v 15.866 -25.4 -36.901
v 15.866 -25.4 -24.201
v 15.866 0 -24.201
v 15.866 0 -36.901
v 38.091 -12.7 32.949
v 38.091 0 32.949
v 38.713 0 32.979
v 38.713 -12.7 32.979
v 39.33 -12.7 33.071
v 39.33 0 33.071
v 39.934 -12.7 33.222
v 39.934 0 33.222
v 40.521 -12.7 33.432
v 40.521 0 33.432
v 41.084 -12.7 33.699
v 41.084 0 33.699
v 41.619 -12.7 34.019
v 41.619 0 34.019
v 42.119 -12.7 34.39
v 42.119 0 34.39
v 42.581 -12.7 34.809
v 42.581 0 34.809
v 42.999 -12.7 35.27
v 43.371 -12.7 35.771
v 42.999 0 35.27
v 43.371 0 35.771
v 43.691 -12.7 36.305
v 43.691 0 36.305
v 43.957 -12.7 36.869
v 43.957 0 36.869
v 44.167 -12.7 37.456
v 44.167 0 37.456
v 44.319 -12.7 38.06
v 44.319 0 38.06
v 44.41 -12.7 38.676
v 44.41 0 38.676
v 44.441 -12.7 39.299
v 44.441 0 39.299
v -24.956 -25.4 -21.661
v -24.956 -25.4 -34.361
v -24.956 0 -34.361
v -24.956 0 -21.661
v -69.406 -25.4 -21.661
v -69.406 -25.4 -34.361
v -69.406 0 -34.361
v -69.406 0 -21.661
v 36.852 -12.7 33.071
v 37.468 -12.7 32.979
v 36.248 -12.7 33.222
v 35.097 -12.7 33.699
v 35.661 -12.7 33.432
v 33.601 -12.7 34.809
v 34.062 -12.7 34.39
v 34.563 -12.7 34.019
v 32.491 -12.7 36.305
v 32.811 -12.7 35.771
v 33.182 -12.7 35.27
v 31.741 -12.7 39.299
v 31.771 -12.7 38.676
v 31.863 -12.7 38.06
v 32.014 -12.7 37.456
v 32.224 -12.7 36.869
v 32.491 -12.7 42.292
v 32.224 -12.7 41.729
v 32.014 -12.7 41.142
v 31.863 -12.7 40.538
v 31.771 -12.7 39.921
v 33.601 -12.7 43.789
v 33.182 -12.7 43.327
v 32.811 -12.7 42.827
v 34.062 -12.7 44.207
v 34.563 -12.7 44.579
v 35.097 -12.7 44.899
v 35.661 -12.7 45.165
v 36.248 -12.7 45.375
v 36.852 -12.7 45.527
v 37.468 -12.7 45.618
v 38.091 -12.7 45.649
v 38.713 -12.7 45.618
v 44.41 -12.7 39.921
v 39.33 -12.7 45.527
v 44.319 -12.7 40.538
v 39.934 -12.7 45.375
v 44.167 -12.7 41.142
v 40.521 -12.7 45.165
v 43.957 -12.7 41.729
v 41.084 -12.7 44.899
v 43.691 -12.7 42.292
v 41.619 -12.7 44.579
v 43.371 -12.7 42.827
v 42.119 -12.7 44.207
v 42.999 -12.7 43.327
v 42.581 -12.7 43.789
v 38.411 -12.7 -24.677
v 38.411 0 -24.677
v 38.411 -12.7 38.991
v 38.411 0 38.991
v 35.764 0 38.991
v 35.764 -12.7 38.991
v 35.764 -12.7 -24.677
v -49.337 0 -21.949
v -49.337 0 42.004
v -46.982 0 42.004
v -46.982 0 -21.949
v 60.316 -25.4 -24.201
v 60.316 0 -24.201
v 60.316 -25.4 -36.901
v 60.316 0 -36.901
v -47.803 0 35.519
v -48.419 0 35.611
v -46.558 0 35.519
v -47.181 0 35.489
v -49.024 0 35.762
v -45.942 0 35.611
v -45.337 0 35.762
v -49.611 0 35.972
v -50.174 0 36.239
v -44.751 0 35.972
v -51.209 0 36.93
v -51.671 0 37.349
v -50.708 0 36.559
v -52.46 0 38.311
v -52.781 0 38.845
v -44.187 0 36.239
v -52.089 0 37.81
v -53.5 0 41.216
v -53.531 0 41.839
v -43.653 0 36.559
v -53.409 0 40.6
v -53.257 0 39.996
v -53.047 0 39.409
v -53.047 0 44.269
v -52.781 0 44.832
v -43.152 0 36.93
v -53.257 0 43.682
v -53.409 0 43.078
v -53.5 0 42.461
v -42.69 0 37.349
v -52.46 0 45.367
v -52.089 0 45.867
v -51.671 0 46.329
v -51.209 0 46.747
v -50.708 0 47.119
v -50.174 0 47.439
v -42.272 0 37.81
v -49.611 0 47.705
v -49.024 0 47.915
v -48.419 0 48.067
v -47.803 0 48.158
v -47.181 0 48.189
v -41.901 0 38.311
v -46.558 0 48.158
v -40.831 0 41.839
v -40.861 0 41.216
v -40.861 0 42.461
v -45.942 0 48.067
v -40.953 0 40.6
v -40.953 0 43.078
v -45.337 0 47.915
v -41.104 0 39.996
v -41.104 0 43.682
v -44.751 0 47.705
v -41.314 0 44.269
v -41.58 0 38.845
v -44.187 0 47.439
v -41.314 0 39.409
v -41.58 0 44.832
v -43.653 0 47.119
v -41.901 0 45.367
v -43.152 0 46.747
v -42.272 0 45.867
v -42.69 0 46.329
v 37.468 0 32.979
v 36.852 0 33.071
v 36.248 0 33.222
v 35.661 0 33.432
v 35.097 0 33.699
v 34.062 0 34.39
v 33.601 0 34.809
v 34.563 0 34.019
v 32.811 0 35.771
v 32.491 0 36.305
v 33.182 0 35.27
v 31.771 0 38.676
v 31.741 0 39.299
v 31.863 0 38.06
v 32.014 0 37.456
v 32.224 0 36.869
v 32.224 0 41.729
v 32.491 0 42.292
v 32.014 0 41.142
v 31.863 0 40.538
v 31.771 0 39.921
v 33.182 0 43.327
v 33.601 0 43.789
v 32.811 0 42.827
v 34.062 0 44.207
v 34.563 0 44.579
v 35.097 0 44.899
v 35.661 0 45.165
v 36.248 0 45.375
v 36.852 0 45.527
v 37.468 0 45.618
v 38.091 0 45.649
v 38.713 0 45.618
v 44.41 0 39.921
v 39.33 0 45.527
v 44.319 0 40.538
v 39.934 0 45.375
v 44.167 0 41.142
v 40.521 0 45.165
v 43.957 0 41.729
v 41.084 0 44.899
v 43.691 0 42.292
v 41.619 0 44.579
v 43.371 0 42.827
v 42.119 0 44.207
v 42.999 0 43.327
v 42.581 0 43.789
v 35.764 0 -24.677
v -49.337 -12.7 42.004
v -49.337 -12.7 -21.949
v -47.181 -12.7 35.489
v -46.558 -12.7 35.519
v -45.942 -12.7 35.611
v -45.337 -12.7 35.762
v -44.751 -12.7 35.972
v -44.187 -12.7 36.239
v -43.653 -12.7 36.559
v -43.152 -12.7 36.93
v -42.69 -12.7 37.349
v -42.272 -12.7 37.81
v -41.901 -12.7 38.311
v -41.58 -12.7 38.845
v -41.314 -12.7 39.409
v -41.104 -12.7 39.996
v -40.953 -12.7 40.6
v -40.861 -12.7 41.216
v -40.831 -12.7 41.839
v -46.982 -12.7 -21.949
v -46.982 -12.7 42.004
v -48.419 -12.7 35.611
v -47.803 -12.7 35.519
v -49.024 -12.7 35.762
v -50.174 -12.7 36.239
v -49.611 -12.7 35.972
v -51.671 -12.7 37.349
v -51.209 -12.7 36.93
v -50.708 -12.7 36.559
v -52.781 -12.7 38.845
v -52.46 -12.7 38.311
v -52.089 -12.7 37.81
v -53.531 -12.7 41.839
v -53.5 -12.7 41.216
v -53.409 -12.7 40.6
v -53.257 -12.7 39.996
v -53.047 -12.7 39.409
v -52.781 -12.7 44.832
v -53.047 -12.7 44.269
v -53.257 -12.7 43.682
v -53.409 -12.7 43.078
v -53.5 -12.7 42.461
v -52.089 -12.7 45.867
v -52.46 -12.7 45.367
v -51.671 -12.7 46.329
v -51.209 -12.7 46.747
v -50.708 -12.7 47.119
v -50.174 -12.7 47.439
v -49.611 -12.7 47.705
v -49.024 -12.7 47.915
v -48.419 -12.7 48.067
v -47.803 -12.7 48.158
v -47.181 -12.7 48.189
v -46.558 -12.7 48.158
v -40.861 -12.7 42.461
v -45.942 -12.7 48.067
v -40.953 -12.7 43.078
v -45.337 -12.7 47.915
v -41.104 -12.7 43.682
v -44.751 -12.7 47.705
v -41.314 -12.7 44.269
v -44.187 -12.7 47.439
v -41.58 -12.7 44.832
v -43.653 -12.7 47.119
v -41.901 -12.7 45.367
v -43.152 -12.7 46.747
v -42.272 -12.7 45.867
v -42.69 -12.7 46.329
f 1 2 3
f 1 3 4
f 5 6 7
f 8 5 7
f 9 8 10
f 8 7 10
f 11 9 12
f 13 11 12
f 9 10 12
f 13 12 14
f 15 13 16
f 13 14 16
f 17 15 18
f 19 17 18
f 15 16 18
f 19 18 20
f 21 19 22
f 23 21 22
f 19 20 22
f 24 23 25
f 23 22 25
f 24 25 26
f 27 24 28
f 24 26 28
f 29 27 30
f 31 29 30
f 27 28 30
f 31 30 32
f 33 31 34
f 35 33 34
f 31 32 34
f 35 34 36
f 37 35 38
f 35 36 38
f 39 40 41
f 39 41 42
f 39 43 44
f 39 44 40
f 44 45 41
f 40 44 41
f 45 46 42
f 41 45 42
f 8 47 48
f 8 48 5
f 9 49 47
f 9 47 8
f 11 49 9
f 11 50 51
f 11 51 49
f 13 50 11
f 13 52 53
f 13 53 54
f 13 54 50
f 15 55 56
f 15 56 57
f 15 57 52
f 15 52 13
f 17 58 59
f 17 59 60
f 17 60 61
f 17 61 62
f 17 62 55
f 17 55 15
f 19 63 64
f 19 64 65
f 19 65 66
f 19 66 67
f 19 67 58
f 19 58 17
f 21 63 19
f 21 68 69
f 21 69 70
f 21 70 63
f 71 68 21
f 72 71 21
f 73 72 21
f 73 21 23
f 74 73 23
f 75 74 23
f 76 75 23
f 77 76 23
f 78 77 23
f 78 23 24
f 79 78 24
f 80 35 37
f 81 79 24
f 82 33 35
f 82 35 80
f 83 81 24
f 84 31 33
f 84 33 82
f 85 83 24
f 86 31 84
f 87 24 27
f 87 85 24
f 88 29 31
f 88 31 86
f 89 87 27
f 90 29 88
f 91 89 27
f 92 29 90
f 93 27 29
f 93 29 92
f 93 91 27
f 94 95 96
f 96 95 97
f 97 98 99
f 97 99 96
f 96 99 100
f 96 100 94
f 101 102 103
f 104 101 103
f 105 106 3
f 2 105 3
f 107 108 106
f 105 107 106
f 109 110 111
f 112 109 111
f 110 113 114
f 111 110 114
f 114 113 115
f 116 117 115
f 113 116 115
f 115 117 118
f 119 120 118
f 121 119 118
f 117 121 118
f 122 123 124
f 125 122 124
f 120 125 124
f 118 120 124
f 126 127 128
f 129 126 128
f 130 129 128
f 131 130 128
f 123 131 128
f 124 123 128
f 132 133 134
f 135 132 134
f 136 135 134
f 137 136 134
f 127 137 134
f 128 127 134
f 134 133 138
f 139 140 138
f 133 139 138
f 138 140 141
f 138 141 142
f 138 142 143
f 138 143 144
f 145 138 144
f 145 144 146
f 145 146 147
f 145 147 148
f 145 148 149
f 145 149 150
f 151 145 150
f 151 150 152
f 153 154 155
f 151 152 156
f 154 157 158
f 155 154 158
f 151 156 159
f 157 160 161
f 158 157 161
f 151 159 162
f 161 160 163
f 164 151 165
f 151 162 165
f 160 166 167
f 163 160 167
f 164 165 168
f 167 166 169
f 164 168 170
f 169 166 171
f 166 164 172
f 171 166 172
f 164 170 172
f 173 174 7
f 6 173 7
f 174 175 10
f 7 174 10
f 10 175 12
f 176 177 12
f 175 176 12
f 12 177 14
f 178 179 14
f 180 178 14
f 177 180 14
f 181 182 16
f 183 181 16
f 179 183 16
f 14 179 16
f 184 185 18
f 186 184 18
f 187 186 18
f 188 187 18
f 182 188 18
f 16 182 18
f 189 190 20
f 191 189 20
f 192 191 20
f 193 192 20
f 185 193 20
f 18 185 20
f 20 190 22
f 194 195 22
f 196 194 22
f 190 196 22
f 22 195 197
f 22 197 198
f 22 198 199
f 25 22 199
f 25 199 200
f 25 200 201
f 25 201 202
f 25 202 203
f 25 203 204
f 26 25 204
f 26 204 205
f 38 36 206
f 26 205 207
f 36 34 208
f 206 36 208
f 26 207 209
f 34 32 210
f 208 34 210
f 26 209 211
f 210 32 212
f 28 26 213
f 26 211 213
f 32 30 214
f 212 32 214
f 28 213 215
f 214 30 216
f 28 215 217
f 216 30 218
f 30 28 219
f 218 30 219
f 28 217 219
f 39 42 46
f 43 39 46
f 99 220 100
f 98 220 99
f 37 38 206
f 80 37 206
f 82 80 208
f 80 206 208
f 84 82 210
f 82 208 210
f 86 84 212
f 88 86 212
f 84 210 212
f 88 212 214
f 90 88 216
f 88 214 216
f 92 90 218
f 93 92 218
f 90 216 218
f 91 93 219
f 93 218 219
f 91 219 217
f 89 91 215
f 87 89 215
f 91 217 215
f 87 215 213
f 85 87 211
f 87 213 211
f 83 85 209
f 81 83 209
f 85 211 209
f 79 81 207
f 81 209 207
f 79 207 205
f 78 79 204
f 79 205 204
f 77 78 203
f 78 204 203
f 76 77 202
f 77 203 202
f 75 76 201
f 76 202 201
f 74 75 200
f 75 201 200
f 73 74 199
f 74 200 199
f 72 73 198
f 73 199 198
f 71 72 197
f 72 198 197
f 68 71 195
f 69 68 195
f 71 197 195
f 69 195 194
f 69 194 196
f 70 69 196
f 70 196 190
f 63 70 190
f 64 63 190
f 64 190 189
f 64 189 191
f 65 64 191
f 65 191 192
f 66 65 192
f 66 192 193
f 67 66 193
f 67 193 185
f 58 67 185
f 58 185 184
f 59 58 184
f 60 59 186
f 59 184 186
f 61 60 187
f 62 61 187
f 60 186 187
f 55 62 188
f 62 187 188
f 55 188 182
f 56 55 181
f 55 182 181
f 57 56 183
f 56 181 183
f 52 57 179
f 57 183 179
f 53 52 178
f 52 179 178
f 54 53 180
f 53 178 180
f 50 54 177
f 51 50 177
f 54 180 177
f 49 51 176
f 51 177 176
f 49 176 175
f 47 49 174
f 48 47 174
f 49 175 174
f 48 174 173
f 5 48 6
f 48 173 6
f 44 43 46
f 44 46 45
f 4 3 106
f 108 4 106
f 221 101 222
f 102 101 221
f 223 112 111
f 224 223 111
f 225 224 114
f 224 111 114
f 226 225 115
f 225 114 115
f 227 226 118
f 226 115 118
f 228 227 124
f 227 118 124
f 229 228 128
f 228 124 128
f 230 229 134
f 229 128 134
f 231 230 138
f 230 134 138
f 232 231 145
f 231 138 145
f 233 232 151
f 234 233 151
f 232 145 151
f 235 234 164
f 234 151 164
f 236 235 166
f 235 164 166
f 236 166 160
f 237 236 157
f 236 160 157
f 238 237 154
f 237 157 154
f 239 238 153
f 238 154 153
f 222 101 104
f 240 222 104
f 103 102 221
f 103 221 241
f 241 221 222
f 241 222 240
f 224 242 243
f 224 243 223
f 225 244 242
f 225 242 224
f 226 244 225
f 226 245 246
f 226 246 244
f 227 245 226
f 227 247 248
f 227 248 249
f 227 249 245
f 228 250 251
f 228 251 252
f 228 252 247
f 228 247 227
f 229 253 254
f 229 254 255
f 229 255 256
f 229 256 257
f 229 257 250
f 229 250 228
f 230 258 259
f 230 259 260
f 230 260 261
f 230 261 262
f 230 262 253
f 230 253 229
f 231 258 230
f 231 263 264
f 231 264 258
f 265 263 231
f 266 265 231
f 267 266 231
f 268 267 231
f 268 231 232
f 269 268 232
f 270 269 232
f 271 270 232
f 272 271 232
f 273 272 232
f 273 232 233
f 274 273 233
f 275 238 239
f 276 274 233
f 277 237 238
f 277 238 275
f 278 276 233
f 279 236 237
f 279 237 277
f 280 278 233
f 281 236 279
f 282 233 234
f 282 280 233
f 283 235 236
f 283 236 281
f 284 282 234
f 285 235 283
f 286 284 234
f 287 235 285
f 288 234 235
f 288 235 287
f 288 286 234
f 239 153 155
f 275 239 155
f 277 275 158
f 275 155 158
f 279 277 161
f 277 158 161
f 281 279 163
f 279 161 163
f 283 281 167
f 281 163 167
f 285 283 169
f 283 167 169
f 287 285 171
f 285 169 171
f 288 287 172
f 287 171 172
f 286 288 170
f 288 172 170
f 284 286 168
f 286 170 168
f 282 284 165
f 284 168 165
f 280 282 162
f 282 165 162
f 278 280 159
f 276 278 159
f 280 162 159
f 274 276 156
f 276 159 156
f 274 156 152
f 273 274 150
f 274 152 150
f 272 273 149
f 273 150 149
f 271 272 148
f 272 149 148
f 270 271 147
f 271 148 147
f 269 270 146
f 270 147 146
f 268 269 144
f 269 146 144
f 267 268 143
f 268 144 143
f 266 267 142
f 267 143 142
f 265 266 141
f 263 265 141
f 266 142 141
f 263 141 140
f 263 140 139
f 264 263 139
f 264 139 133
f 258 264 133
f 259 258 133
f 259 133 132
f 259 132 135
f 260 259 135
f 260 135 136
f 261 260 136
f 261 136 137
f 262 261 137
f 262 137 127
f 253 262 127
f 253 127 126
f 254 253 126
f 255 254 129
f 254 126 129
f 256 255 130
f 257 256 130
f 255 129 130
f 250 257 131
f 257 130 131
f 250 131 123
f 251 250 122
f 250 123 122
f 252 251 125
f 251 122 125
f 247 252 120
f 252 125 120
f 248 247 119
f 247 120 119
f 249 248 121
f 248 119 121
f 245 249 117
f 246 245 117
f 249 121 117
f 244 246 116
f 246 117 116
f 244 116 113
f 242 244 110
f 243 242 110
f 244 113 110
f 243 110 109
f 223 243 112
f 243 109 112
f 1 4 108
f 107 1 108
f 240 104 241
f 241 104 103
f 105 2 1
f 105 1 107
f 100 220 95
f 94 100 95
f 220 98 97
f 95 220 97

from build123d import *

# Parameters (mm, degrees)
F1_DEPTH = 25.4
F2_DEPTH = 12.7
F3_W     = 2.646983
F3_H     = 63.667882
F3_W_2   = 2.354983
F3_H_2   = 63.953007
F4_DEPTH = 12.7


with BuildPart() as f1:
    # F0 (on Front) → F1 (new body)
    with BuildSketch(Plane.XZ):
        Polygon((-47.180578, -21.661135), (-69.405578, -21.661135), (-69.405578, -34.361135), (-24.955578, -34.361135), (-24.955578, -21.661135), align=None)
        Polygon((38.090863, -24.201136), (15.865863, -24.201136), (15.865863, -36.901136), (60.315863, -36.901136), (60.315863, -24.201136), align=None)
    extrude(amount=F1_DEPTH)


with BuildPart() as f2:
    # F0 (on Front) → F2 (new body)
    with BuildSketch(Plane.XZ):
        with BuildLine():
            ThreePointArc((44.440863, 39.298864), (33.600735, 43.788992), (38.090863, 32.948864))
            ThreePointArc((38.090863, 32.948864), (42.580991, 34.808736), (44.440863, 39.298864))
        make_face()
        with BuildLine():
            ThreePointArc((-40.830578, 41.838865), (-51.670706, 46.328993), (-47.180578, 35.488865))
            ThreePointArc((-47.180578, 35.488865), (-42.69045, 37.348737), (-40.830578, 41.838865))
        make_face()
    extrude(amount=F2_DEPTH)


with BuildPart() as f4:
    # F3 (on Front) → F4 (new body)
    with BuildSketch(Plane.XZ):
        with Locations((37.087604, 7.156657)):
            Rectangle(F3_W, F3_H)
        with Locations((-48.159053, 10.027694)):
            Rectangle(F3_W_2, F3_H_2)
    extrude(amount=F4_DEPTH)


solid = Compound([f1.part, f2.part, f4.part])
